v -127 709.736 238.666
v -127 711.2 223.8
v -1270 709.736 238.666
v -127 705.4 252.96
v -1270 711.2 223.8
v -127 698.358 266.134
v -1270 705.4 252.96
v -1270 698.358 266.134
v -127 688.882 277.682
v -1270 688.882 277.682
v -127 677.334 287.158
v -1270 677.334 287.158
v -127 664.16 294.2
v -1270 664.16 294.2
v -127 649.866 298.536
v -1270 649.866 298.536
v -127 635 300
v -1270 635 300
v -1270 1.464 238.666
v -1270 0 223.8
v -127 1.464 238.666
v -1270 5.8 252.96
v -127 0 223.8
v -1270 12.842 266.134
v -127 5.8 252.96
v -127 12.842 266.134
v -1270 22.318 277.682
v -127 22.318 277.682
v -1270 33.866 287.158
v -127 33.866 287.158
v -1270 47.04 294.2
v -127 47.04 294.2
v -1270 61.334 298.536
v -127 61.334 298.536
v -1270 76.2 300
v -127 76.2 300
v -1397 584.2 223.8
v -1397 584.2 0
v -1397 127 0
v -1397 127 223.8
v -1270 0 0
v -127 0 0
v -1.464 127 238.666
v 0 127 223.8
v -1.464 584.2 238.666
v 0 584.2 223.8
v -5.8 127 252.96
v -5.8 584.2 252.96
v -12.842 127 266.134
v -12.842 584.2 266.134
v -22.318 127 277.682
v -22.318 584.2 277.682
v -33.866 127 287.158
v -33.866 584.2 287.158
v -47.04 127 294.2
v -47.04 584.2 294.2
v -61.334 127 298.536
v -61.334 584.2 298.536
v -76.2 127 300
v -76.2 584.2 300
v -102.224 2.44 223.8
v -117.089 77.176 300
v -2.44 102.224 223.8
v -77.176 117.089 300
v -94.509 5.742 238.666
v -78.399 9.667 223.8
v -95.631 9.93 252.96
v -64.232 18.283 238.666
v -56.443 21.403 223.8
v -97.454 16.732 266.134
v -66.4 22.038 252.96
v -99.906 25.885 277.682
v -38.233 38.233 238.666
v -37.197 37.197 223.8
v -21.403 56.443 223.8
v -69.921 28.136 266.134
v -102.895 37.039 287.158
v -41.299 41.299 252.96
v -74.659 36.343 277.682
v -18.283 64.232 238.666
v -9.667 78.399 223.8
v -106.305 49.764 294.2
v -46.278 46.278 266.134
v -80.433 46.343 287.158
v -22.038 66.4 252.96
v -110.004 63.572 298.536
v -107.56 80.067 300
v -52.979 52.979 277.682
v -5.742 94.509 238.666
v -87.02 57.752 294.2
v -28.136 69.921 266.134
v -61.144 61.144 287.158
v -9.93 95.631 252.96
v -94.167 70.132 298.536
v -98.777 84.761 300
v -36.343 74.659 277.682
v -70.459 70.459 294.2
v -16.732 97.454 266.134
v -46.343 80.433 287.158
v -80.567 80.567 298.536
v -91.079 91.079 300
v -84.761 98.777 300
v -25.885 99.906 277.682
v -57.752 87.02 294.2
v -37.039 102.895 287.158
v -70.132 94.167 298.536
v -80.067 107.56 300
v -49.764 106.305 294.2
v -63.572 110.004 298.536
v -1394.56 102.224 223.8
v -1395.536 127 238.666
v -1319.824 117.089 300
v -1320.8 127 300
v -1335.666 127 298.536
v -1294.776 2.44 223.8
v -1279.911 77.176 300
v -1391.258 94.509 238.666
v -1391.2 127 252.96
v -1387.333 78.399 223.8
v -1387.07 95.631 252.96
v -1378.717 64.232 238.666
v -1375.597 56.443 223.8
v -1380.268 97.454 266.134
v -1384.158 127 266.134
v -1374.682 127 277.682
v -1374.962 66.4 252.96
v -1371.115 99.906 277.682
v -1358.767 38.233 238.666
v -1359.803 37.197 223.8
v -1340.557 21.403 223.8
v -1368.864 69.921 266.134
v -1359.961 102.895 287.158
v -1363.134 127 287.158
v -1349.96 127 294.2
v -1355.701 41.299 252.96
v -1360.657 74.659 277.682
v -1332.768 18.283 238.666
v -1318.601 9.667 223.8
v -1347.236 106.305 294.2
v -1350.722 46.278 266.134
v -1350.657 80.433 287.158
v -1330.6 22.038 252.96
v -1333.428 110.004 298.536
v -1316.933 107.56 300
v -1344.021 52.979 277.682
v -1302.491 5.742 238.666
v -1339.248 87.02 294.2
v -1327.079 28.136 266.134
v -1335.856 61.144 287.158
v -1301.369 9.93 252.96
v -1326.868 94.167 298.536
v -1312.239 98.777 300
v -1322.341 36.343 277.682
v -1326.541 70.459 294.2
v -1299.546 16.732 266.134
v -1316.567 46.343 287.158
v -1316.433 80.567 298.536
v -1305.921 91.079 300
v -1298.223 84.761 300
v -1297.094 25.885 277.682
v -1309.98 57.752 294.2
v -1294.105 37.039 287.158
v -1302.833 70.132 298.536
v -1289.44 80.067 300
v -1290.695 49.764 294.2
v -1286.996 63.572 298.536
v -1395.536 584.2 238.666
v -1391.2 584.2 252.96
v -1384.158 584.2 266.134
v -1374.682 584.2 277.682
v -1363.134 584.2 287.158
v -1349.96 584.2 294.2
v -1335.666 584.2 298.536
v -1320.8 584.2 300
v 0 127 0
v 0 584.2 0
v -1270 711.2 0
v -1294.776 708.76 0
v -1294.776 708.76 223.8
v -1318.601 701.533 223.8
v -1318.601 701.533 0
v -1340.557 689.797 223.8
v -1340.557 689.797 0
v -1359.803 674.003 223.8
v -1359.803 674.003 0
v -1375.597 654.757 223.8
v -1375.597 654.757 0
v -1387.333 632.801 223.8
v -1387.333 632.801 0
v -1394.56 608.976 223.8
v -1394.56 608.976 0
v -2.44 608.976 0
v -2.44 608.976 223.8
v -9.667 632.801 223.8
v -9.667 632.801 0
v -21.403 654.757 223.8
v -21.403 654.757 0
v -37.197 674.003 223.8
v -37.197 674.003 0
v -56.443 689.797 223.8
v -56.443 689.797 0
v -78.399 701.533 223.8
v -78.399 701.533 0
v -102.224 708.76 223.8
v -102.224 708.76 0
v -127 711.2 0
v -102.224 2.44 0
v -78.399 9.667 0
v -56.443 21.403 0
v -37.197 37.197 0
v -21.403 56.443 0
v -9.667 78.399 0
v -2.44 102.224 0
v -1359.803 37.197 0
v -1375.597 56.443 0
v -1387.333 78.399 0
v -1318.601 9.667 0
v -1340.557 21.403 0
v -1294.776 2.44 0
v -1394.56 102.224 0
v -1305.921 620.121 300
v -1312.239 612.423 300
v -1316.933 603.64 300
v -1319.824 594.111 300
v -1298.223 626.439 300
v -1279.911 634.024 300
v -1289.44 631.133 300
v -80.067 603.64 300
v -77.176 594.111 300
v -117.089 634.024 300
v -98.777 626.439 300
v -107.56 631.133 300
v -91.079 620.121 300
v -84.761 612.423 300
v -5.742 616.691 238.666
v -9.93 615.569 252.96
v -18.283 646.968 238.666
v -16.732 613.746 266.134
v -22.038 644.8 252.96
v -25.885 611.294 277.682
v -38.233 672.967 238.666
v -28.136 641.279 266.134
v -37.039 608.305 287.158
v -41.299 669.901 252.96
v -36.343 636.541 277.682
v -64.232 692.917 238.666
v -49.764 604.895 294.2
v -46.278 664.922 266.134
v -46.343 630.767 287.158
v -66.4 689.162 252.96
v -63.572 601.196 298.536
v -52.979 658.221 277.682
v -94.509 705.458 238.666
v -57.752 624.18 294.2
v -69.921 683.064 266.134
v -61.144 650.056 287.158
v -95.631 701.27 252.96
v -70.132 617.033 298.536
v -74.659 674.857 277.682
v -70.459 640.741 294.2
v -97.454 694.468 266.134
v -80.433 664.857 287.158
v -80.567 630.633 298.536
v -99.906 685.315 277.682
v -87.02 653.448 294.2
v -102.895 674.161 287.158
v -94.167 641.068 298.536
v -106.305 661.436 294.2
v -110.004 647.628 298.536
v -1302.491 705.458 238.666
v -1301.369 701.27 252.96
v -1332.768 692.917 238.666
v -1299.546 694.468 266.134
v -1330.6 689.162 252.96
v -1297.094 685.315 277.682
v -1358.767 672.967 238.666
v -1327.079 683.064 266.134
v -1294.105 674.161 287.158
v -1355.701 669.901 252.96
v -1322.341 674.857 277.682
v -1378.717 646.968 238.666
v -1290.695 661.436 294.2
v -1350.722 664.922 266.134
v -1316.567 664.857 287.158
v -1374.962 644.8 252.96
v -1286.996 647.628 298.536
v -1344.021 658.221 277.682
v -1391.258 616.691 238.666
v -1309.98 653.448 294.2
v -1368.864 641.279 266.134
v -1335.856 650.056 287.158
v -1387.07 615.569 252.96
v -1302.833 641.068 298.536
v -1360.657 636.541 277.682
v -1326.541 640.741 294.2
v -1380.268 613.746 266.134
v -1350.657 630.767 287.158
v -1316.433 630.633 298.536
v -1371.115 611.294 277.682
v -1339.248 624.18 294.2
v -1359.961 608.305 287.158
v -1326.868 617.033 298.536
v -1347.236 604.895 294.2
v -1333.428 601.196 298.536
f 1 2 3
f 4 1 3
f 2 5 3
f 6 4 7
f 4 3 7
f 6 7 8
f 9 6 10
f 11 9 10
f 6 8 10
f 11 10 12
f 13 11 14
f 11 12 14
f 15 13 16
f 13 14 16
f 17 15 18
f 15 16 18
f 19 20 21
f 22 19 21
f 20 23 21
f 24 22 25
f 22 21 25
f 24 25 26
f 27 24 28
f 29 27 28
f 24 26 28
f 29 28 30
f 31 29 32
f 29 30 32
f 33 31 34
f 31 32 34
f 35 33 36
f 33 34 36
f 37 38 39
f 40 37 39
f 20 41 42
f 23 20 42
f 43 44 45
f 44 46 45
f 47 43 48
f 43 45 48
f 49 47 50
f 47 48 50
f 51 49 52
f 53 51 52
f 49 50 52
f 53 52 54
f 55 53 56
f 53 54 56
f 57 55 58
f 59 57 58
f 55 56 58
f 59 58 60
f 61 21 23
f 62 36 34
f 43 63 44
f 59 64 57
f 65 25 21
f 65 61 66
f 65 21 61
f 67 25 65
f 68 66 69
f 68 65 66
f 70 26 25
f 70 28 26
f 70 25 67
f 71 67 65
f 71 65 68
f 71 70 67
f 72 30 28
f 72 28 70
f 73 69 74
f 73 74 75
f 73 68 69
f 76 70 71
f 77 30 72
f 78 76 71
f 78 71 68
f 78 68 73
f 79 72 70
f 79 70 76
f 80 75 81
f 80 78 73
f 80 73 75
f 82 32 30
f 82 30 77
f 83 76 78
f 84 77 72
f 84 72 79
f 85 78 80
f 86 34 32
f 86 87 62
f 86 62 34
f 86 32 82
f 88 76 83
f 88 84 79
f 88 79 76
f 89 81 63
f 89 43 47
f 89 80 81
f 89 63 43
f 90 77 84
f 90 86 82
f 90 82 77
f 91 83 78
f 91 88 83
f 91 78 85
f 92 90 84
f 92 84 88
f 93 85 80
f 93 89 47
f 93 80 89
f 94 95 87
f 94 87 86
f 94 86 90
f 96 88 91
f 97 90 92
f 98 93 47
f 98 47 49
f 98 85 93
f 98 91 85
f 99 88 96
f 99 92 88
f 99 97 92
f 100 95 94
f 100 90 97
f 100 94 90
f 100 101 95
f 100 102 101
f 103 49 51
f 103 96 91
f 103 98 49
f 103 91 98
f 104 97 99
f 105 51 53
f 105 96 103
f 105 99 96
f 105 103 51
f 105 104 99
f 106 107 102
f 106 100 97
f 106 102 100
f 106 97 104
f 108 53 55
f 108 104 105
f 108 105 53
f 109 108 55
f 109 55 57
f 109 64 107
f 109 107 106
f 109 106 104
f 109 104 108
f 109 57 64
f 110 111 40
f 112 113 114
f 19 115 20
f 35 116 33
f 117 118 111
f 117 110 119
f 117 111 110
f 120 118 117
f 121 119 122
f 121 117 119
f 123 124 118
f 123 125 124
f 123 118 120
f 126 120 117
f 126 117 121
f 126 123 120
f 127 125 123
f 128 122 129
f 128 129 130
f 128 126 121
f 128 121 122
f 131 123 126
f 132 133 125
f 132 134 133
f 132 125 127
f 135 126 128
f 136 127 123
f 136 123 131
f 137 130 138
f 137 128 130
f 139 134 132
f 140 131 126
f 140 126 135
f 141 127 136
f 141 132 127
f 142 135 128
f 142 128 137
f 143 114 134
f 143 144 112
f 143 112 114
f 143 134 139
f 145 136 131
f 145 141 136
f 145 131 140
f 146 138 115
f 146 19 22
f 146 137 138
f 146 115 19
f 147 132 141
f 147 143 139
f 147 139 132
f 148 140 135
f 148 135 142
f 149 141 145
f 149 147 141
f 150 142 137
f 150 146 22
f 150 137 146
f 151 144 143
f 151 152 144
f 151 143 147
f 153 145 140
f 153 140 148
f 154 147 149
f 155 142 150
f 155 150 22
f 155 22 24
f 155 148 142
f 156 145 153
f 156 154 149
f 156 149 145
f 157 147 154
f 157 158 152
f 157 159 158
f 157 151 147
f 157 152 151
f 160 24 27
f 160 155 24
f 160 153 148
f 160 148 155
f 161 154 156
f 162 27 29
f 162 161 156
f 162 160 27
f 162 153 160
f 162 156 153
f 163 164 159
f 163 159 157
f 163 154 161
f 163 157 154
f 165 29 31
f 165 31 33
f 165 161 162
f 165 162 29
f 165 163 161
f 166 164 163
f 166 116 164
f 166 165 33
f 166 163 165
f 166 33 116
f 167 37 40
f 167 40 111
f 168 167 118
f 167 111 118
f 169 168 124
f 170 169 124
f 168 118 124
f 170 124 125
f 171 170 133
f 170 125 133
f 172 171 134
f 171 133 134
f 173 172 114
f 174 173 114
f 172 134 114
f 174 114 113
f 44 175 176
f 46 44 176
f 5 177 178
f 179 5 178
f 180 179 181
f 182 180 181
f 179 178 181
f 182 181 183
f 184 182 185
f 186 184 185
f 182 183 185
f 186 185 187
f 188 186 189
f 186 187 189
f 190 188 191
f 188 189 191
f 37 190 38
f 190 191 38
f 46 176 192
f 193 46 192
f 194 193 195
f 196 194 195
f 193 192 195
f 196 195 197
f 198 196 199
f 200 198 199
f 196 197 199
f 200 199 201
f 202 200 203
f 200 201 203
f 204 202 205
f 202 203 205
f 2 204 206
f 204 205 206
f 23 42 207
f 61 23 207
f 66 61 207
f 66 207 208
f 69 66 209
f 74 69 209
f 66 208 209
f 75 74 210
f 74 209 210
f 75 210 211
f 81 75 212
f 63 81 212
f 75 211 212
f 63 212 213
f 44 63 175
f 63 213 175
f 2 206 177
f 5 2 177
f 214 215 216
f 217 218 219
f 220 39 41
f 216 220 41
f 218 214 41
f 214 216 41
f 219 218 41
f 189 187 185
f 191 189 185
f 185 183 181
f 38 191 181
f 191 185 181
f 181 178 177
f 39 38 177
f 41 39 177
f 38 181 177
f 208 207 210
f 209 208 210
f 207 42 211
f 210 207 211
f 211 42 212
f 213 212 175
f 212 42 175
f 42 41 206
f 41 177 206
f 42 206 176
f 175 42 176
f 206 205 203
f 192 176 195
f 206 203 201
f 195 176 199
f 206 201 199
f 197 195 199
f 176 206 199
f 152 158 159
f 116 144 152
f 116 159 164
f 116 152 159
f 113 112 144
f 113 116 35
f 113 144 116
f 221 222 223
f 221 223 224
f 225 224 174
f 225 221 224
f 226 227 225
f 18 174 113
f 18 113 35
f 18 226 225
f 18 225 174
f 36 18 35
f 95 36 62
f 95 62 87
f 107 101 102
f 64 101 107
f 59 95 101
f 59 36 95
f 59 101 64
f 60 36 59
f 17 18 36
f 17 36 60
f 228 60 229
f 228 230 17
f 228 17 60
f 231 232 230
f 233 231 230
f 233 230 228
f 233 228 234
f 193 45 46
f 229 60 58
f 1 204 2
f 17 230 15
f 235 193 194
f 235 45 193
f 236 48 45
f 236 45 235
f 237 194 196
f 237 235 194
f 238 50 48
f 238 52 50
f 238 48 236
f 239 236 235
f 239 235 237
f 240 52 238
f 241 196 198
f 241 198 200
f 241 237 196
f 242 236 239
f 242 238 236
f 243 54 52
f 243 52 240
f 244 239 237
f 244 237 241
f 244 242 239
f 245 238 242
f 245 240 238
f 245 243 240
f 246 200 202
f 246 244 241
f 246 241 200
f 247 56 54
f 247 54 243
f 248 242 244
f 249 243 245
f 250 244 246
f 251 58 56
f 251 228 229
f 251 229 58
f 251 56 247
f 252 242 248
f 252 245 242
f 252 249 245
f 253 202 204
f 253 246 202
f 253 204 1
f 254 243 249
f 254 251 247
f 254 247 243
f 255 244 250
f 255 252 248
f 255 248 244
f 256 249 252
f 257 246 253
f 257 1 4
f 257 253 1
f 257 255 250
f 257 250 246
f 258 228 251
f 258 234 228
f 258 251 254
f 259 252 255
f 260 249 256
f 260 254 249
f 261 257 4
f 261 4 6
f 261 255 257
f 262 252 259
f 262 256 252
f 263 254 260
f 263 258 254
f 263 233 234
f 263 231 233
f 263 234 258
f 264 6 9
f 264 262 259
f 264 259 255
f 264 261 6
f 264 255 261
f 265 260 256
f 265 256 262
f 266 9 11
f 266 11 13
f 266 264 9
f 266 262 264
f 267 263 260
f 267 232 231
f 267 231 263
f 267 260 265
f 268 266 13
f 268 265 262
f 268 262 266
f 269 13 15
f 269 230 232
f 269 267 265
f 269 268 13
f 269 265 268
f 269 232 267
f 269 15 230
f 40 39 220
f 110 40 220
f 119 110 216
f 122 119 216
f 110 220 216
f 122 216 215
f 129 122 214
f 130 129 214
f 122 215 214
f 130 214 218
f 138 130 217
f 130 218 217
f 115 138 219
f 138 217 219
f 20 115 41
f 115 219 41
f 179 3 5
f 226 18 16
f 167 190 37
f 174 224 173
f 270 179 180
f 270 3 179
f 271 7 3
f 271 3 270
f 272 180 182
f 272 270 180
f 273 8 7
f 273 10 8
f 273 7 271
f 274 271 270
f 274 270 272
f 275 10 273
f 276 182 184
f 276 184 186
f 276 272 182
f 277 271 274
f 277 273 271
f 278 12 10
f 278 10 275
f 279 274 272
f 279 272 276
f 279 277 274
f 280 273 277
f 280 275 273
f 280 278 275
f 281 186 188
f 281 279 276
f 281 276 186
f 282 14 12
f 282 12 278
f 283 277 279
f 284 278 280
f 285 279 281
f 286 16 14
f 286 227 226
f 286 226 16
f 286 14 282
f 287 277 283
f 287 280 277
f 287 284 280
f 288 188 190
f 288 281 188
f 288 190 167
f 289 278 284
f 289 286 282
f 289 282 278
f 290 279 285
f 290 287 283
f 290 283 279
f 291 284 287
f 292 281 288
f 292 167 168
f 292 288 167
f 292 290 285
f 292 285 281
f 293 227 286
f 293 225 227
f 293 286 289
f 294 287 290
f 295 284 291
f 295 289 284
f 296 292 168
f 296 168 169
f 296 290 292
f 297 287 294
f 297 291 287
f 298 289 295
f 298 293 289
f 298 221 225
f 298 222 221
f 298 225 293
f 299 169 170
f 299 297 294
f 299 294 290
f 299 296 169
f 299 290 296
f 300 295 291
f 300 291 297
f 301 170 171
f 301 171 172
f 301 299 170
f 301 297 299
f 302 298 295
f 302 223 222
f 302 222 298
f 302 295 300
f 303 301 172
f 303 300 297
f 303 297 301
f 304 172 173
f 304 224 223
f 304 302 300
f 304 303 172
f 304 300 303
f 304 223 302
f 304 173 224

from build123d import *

# Parameters (mm, degrees)
F1_DEPTH = 300
F2_R     = 76.2


with BuildPart() as f1:
    # F0 (on Top) → F1 (new body)
    with BuildSketch(Plane.XY):
        with BuildLine():
            Line((-1270, 0), (-127, 0))
            ThreePointArc((-127, 0), (-37.197439, 37.197439), (0, 127))
            Line((0, 127), (0, 584.2))
            ThreePointArc((0, 584.2), (-37.197439, 674.002561), (-127, 711.2))
            Line((-127, 711.2), (-1270, 711.2))
            ThreePointArc((-1270, 711.2), (-1359.802561, 674.002561), (-1397, 584.2))
            Line((-1397, 584.2), (-1397, 127))
            ThreePointArc((-1397, 127), (-1359.802561, 37.197439), (-1270, 0))
        make_face()
    extrude(amount=F1_DEPTH)

    # F2
    f2_edges = [f1.edges().sort_by_distance(p)[0] for p in [
        (-698.5, 0, 300),
        (-37.197439, 37.197439, 300),
        (0, 355.6, 300),
        (-37.197439, 674.002561, 300),
        (-698.5, 711.2, 300),
        (-1359.802561, 674.002561, 300),
        (-1397, 355.6, 300),
        (-1359.802561, 37.197439, 300),
    ]]
    fillet(f2_edges, radius=F2_R)


solid = f1.part
